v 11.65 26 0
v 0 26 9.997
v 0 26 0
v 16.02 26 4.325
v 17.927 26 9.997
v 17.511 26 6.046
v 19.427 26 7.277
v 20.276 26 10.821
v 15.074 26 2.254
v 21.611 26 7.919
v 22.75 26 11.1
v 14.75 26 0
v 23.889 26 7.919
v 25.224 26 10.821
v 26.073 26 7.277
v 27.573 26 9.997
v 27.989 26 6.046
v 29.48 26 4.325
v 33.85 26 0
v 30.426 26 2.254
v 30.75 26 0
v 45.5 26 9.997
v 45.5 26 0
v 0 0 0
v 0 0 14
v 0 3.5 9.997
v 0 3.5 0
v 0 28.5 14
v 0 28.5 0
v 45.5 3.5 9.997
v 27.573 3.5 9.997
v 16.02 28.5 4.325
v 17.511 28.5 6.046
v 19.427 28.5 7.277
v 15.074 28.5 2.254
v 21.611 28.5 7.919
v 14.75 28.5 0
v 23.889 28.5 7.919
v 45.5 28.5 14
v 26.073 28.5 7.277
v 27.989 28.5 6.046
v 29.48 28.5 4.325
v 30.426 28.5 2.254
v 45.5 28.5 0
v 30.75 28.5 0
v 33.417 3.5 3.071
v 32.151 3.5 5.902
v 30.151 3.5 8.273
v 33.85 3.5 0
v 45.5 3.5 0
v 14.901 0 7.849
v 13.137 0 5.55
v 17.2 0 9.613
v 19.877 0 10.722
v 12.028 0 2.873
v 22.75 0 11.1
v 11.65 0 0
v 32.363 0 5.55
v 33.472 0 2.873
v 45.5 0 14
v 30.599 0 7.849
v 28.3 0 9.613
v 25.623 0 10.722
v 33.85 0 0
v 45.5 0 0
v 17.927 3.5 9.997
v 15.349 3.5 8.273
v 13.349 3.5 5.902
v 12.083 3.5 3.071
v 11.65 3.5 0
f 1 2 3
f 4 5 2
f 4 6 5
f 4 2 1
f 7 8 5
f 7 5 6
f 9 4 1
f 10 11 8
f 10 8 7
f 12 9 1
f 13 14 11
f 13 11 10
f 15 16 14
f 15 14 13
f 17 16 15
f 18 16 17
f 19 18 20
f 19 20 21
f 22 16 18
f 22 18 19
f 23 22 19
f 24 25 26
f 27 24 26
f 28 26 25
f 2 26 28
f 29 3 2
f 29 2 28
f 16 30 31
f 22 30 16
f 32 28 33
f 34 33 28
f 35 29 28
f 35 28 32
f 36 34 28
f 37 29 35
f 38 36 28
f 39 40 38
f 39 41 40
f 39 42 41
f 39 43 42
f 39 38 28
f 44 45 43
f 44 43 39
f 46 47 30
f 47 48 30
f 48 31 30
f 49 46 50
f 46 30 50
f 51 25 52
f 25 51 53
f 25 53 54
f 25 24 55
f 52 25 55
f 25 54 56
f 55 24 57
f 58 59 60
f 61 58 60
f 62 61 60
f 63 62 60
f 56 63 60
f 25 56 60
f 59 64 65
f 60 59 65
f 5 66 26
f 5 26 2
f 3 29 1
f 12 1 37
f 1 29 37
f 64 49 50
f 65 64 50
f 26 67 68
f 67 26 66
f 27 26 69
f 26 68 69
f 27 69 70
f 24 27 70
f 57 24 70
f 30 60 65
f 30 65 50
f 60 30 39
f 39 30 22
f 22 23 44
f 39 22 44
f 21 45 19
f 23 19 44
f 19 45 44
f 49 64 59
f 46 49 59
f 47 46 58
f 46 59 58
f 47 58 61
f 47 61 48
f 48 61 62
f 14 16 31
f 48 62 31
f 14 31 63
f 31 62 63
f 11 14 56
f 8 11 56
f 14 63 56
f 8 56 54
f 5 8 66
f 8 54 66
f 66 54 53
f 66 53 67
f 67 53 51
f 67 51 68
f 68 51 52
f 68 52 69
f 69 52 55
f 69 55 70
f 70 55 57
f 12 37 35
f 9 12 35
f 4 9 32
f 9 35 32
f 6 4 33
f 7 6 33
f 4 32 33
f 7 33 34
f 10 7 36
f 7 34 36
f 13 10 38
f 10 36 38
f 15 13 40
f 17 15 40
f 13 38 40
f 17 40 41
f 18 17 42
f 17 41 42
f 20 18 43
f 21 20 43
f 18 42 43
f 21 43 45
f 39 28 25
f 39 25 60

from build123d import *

# Parameters (mm, degrees)
SKETCH1_W           = 45.5
SKETCH1_H           = 28.5
BOSS_EXTRUDE1_DEPTH = 14
SKETCH2_R           = 8
CUT_EXTRUDE1_DEPTH  = 30
SKETCH3_R           = 11.1
CUT_EXTRUDE2_DEPTH  = 26
SKETCH4_W           = 9.997259543
SKETCH4_H           = 22.5
CUT_EXTRUDE3_DEPTH  = 56.484231994


with BuildPart() as part:
    # Sketch1 → Boss-Extrude1 (new body)
    with BuildSketch(Plane.XY):
        with Locations((22.75, 14.25)):
            Rectangle(SKETCH1_W, SKETCH1_H)
    extrude(amount=BOSS_EXTRUDE1_DEPTH)

    # Sketch2 → Cut-Extrude1 (cut)
    with BuildSketch(Plane(origin=(0, 28.5, 0), x_dir=(1, 0, 0), z_dir=(0, 1, 0))):
        with Locations((22.75, 0)):
            Circle(SKETCH2_R)
    extrude(amount=-CUT_EXTRUDE1_DEPTH, mode=Mode.SUBTRACT)

    # Sketch3 → Cut-Extrude2 (cut)
    with BuildSketch(Plane.XZ):
        with Locations((22.75, 0)):
            Circle(SKETCH3_R)
    extrude(amount=-CUT_EXTRUDE2_DEPTH, mode=Mode.SUBTRACT)

    # Sketch4 → Cut-Extrude3 (cut, through all)
    with BuildSketch(Plane(origin=(45.5, 0, 0), x_dir=(0, 0, -1), z_dir=(1, 0, 0))):
        with Locations((-4.998629772, 14.75)):
            Rectangle(SKETCH4_W, SKETCH4_H)
    extrude(amount=-CUT_EXTRUDE3_DEPTH, mode=Mode.SUBTRACT)


solid = part.part
